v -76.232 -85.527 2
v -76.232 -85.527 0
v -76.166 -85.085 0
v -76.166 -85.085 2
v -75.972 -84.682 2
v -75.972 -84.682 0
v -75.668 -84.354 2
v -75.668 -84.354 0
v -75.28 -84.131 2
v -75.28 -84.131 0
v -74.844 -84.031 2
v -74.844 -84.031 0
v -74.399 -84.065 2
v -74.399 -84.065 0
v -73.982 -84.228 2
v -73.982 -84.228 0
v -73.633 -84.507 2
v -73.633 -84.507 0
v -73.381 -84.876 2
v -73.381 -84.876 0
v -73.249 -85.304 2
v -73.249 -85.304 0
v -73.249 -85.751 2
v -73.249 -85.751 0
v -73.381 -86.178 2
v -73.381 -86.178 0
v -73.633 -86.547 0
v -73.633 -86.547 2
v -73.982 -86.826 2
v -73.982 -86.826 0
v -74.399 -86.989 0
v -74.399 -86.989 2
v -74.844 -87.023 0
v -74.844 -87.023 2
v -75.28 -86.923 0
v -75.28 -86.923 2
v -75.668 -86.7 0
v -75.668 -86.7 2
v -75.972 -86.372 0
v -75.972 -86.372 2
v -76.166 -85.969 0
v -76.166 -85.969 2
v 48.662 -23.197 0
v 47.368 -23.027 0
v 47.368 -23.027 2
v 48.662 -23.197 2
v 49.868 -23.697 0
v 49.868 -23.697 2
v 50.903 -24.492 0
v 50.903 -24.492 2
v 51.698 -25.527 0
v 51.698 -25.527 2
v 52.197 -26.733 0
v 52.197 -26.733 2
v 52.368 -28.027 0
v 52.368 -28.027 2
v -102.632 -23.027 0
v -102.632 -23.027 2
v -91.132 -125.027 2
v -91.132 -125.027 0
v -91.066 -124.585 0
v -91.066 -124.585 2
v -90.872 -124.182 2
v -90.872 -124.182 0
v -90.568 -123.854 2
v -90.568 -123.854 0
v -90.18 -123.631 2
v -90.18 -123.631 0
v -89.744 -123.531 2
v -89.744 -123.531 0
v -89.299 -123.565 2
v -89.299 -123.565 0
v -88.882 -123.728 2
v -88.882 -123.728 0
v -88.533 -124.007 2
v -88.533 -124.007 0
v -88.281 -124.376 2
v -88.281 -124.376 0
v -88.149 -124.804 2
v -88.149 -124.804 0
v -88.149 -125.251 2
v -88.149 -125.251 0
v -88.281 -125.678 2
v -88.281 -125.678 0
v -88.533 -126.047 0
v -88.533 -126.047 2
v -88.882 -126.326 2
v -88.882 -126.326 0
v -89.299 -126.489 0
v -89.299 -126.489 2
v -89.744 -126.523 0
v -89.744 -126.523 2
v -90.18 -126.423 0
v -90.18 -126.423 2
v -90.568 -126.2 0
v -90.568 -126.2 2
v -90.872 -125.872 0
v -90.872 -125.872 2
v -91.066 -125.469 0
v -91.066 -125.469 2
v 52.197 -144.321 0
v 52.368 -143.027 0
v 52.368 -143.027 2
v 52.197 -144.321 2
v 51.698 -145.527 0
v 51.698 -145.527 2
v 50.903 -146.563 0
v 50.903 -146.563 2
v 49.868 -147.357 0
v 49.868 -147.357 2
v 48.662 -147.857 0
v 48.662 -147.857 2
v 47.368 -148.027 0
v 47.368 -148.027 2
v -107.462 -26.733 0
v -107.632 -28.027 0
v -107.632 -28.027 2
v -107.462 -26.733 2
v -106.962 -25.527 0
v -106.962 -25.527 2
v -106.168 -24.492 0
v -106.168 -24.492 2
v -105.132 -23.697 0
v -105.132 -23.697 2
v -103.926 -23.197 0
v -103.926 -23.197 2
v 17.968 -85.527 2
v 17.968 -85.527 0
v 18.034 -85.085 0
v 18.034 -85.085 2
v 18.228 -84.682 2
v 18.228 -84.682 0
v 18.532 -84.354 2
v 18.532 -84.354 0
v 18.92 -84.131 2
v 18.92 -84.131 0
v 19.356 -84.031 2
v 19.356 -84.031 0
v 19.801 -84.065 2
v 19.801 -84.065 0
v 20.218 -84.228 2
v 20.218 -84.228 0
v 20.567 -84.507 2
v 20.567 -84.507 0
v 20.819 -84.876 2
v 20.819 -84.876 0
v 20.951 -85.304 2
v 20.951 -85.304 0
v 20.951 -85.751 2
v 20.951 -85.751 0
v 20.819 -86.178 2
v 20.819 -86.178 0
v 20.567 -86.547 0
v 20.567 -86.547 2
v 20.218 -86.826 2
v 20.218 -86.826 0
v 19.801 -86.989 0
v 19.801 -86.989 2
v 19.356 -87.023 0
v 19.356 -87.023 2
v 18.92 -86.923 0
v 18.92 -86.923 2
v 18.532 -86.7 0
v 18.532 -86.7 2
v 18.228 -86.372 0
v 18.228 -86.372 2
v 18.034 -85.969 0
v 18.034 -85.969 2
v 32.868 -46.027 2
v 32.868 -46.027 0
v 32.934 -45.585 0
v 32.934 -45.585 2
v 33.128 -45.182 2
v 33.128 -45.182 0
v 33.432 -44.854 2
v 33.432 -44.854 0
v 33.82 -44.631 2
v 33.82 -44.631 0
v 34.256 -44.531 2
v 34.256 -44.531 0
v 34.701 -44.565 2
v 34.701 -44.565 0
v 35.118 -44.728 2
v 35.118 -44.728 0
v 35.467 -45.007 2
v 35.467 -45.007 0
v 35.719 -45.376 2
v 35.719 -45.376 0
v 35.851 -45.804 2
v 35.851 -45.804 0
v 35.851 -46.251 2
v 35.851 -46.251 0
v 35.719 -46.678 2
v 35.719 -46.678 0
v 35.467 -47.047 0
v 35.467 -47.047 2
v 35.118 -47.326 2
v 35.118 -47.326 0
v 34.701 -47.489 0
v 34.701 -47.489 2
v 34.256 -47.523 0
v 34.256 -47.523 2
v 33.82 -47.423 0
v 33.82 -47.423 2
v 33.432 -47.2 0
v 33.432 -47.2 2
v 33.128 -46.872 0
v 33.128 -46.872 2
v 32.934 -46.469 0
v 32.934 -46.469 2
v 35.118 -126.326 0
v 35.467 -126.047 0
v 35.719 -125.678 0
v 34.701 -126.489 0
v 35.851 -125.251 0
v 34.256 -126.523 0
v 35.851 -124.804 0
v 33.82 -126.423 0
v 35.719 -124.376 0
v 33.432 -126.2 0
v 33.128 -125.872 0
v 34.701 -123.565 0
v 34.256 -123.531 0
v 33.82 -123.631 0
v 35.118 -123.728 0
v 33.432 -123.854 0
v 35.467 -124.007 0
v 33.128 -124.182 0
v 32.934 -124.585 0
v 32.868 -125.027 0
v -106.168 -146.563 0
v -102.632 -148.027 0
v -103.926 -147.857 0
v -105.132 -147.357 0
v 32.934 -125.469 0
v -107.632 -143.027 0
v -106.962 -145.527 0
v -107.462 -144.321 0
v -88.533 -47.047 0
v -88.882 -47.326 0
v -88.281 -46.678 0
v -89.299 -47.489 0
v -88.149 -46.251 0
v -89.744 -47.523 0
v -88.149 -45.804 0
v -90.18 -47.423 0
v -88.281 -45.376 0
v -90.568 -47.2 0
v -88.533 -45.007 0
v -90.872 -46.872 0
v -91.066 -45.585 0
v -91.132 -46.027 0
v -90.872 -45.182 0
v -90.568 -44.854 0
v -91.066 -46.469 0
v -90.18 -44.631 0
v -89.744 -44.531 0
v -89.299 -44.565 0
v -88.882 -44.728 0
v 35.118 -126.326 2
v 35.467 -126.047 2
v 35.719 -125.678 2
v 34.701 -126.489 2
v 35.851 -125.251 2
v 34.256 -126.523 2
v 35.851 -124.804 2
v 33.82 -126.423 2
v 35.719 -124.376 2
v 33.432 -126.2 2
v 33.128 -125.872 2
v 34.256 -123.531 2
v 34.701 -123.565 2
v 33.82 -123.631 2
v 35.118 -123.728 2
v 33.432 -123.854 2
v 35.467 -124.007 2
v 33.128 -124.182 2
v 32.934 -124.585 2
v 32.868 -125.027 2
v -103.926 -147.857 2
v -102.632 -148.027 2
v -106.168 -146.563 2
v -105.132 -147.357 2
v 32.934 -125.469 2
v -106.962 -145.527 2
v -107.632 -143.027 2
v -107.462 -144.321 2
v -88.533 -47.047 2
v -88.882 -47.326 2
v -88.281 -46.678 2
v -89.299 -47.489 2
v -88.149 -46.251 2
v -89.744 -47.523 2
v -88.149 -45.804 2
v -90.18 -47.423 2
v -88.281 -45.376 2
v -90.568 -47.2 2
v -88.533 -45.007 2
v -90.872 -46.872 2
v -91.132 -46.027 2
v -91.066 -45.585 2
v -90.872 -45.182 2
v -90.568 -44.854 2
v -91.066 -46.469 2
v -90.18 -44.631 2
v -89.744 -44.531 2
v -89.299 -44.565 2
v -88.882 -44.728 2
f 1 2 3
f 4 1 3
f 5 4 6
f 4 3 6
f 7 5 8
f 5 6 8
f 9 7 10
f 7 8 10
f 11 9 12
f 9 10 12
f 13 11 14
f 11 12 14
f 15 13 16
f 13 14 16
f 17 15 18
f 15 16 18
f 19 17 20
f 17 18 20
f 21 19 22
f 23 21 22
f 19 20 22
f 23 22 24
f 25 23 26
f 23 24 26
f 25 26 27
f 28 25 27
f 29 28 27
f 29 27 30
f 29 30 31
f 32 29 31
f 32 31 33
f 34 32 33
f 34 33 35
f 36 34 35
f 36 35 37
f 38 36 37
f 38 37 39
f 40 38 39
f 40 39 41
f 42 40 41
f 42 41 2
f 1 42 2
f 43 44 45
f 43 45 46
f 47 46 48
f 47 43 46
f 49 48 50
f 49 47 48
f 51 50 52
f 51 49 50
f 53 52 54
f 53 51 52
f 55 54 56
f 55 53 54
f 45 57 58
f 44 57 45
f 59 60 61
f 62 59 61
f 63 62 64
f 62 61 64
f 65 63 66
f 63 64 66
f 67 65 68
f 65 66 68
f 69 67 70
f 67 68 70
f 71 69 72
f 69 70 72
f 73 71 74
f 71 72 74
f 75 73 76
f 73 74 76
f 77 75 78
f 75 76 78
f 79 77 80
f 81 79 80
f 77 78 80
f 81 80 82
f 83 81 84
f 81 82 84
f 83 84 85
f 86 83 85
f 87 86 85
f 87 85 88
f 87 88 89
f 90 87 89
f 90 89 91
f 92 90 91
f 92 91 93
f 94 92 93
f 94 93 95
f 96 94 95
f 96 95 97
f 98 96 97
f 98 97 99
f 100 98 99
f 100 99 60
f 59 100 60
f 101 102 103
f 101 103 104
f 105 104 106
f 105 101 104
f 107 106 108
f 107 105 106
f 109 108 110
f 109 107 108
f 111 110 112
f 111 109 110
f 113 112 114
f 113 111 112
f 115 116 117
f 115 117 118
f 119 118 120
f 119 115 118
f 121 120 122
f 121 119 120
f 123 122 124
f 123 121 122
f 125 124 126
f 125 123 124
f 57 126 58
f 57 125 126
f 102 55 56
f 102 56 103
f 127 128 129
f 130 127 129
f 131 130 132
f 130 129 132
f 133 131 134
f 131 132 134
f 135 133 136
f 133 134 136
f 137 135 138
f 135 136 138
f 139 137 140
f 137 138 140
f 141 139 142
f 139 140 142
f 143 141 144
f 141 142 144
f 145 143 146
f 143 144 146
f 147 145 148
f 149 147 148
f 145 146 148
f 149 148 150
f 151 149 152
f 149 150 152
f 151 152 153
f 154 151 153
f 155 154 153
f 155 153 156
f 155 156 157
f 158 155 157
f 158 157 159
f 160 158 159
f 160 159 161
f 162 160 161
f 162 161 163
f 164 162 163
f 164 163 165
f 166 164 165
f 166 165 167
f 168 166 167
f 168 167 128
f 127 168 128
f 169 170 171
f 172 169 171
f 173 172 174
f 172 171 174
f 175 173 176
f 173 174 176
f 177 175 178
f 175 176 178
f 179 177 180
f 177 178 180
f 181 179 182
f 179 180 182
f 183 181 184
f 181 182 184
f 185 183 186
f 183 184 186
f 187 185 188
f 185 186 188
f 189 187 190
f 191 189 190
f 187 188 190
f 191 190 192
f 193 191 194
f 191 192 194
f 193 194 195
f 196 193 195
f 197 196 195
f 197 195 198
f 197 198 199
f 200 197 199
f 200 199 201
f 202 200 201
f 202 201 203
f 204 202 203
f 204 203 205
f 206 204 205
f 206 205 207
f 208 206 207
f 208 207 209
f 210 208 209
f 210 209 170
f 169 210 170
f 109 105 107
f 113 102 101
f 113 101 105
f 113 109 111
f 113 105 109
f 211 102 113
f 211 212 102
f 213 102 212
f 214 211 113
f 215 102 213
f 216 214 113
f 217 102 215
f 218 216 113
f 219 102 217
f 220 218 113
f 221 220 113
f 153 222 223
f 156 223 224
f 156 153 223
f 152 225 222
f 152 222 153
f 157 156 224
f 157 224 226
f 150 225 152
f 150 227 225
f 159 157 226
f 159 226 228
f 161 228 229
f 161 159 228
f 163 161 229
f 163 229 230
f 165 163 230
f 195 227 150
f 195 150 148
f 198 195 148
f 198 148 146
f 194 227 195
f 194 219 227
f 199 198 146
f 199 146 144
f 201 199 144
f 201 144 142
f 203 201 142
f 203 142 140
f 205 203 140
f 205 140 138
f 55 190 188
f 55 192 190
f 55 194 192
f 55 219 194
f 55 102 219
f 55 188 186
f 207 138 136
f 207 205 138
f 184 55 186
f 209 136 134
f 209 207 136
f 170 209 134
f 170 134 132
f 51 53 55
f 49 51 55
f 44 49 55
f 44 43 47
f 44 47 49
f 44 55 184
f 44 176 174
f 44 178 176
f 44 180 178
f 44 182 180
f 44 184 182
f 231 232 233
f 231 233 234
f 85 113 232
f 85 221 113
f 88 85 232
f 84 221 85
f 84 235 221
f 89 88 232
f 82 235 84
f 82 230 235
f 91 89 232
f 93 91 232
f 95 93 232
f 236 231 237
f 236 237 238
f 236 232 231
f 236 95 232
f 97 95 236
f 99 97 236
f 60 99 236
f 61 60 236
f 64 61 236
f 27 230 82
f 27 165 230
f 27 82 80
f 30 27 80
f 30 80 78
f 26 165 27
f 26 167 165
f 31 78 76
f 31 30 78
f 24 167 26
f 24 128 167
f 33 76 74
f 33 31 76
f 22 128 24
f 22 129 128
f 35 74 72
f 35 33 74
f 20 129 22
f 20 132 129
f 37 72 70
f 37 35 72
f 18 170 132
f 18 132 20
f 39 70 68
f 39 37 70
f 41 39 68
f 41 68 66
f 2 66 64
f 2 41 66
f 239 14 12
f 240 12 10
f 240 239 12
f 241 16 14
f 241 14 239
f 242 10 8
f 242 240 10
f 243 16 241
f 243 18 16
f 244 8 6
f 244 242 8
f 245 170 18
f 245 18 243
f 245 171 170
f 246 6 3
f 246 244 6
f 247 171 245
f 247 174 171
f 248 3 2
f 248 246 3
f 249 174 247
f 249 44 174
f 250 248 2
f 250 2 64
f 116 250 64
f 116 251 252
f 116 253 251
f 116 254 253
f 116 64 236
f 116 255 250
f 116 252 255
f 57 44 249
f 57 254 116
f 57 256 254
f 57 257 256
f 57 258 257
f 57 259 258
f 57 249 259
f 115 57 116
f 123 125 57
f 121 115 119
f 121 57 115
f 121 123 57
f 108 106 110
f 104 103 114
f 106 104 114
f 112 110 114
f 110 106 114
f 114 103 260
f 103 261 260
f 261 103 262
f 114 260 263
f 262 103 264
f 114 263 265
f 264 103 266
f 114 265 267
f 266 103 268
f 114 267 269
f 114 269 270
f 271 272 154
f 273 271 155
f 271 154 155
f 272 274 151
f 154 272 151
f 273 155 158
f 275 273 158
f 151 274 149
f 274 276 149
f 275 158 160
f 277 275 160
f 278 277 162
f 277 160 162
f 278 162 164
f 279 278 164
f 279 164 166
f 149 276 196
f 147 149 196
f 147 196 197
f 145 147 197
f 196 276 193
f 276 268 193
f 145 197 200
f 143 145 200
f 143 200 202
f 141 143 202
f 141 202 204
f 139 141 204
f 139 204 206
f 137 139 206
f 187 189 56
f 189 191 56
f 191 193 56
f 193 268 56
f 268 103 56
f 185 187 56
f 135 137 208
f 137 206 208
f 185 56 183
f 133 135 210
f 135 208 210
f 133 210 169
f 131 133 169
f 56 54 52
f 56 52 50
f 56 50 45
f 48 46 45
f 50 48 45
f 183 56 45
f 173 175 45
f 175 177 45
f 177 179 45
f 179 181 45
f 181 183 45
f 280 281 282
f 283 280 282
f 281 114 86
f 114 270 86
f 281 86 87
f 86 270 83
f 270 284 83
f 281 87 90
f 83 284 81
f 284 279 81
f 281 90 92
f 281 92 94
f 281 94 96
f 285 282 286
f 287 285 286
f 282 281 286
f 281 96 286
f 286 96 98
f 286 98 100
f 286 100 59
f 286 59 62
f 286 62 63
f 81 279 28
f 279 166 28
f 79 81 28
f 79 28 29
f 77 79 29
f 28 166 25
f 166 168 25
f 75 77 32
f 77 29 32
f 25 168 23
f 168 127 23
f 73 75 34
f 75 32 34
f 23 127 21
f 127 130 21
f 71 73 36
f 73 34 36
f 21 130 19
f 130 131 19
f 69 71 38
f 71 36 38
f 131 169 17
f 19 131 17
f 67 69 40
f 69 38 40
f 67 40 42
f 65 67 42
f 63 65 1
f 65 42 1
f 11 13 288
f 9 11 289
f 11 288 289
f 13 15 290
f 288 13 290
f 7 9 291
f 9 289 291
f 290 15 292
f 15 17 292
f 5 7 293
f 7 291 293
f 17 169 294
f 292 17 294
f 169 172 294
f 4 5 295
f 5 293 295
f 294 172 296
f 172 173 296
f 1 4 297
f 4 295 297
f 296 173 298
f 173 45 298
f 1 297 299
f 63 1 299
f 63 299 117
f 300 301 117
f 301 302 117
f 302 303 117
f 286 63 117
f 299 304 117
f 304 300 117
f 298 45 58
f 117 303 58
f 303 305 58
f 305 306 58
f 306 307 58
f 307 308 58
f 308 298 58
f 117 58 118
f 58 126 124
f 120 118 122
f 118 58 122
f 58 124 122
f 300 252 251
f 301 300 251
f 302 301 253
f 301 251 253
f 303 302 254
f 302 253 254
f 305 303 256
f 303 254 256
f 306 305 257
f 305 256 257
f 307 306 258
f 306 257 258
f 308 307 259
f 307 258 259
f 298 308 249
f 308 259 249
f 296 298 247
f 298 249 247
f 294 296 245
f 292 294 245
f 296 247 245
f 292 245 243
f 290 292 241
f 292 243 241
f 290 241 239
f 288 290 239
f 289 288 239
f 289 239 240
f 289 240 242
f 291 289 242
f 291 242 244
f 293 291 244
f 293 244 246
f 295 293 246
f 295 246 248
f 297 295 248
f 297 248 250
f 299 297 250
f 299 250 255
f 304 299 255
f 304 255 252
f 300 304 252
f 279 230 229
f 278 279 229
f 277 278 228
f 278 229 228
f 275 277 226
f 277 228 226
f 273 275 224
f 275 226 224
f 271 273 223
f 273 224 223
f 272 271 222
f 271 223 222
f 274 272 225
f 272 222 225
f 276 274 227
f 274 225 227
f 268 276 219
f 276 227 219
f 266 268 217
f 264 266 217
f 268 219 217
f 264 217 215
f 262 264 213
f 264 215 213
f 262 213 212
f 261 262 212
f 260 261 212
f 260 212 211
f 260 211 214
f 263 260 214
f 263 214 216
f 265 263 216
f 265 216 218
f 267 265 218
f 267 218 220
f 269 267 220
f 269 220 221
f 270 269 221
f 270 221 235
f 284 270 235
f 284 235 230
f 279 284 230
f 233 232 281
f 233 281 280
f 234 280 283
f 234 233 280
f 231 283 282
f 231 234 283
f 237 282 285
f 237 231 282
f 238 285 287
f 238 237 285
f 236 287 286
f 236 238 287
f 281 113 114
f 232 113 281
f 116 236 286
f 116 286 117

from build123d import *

# Parameters (mm, degrees)
RESSALTO_EXTRUS_O1_DEPTH = 2
ESBO_O2_R                = 1.5
CORTE_EXTRUS_O1_DEPTH    = 10


with BuildPart() as part:
    # Esboço1 → Ressalto-extrusão1 (new body)
    with BuildSketch(Plane.XY):
        with BuildLine():
            Line((47.367635672, -148.027068541), (-102.632364328, -148.027068541))
            ThreePointArc((-102.632364328, -148.027068541), (-106.167898234, -146.562602447), (-107.632364328, -143.027068541))
            Line((-107.632364328, -143.027068541), (-107.632364328, -28.027068541))
            ThreePointArc((-107.632364328, -28.027068541), (-106.167898234, -24.491534635), (-102.632364328, -23.027068541))
            Line((-102.632364328, -23.027068541), (47.367635672, -23.027068541))
            ThreePointArc((47.367635672, -23.027068541), (50.903169578, -24.491534635), (52.367635672, -28.027068541))
            Line((52.367635672, -28.027068541), (52.367635672, -143.027068541))
            ThreePointArc((52.367635672, -143.027068541), (50.903169578, -146.562602447), (47.367635672, -148.027068541))
        make_face()
    extrude(amount=RESSALTO_EXTRUS_O1_DEPTH)

    # Esboço2 → Corte-extrusão1 (cut)
    with BuildSketch(Plane(origin=(0, 0, 0), x_dir=(-1, 0, 0), z_dir=(0, 0, -1))):
        with Locations((-34.367635672, -125.027068541)):
            Circle(ESBO_O2_R)
        with Locations((-19.467635672, -85.527068541)):
            Circle(ESBO_O2_R)
        with Locations((-34.367635672, -46.027068541)):
            Circle(ESBO_O2_R)
        with Locations((89.632364328, -46.027068541)):
            Circle(ESBO_O2_R)
        with Locations((74.732364328, -85.527068541)):
            Circle(ESBO_O2_R)
        with Locations((89.632364328, -125.027068541)):
            Circle(ESBO_O2_R)
    extrude(amount=-CORTE_EXTRUS_O1_DEPTH, mode=Mode.SUBTRACT)


solid = part.part
